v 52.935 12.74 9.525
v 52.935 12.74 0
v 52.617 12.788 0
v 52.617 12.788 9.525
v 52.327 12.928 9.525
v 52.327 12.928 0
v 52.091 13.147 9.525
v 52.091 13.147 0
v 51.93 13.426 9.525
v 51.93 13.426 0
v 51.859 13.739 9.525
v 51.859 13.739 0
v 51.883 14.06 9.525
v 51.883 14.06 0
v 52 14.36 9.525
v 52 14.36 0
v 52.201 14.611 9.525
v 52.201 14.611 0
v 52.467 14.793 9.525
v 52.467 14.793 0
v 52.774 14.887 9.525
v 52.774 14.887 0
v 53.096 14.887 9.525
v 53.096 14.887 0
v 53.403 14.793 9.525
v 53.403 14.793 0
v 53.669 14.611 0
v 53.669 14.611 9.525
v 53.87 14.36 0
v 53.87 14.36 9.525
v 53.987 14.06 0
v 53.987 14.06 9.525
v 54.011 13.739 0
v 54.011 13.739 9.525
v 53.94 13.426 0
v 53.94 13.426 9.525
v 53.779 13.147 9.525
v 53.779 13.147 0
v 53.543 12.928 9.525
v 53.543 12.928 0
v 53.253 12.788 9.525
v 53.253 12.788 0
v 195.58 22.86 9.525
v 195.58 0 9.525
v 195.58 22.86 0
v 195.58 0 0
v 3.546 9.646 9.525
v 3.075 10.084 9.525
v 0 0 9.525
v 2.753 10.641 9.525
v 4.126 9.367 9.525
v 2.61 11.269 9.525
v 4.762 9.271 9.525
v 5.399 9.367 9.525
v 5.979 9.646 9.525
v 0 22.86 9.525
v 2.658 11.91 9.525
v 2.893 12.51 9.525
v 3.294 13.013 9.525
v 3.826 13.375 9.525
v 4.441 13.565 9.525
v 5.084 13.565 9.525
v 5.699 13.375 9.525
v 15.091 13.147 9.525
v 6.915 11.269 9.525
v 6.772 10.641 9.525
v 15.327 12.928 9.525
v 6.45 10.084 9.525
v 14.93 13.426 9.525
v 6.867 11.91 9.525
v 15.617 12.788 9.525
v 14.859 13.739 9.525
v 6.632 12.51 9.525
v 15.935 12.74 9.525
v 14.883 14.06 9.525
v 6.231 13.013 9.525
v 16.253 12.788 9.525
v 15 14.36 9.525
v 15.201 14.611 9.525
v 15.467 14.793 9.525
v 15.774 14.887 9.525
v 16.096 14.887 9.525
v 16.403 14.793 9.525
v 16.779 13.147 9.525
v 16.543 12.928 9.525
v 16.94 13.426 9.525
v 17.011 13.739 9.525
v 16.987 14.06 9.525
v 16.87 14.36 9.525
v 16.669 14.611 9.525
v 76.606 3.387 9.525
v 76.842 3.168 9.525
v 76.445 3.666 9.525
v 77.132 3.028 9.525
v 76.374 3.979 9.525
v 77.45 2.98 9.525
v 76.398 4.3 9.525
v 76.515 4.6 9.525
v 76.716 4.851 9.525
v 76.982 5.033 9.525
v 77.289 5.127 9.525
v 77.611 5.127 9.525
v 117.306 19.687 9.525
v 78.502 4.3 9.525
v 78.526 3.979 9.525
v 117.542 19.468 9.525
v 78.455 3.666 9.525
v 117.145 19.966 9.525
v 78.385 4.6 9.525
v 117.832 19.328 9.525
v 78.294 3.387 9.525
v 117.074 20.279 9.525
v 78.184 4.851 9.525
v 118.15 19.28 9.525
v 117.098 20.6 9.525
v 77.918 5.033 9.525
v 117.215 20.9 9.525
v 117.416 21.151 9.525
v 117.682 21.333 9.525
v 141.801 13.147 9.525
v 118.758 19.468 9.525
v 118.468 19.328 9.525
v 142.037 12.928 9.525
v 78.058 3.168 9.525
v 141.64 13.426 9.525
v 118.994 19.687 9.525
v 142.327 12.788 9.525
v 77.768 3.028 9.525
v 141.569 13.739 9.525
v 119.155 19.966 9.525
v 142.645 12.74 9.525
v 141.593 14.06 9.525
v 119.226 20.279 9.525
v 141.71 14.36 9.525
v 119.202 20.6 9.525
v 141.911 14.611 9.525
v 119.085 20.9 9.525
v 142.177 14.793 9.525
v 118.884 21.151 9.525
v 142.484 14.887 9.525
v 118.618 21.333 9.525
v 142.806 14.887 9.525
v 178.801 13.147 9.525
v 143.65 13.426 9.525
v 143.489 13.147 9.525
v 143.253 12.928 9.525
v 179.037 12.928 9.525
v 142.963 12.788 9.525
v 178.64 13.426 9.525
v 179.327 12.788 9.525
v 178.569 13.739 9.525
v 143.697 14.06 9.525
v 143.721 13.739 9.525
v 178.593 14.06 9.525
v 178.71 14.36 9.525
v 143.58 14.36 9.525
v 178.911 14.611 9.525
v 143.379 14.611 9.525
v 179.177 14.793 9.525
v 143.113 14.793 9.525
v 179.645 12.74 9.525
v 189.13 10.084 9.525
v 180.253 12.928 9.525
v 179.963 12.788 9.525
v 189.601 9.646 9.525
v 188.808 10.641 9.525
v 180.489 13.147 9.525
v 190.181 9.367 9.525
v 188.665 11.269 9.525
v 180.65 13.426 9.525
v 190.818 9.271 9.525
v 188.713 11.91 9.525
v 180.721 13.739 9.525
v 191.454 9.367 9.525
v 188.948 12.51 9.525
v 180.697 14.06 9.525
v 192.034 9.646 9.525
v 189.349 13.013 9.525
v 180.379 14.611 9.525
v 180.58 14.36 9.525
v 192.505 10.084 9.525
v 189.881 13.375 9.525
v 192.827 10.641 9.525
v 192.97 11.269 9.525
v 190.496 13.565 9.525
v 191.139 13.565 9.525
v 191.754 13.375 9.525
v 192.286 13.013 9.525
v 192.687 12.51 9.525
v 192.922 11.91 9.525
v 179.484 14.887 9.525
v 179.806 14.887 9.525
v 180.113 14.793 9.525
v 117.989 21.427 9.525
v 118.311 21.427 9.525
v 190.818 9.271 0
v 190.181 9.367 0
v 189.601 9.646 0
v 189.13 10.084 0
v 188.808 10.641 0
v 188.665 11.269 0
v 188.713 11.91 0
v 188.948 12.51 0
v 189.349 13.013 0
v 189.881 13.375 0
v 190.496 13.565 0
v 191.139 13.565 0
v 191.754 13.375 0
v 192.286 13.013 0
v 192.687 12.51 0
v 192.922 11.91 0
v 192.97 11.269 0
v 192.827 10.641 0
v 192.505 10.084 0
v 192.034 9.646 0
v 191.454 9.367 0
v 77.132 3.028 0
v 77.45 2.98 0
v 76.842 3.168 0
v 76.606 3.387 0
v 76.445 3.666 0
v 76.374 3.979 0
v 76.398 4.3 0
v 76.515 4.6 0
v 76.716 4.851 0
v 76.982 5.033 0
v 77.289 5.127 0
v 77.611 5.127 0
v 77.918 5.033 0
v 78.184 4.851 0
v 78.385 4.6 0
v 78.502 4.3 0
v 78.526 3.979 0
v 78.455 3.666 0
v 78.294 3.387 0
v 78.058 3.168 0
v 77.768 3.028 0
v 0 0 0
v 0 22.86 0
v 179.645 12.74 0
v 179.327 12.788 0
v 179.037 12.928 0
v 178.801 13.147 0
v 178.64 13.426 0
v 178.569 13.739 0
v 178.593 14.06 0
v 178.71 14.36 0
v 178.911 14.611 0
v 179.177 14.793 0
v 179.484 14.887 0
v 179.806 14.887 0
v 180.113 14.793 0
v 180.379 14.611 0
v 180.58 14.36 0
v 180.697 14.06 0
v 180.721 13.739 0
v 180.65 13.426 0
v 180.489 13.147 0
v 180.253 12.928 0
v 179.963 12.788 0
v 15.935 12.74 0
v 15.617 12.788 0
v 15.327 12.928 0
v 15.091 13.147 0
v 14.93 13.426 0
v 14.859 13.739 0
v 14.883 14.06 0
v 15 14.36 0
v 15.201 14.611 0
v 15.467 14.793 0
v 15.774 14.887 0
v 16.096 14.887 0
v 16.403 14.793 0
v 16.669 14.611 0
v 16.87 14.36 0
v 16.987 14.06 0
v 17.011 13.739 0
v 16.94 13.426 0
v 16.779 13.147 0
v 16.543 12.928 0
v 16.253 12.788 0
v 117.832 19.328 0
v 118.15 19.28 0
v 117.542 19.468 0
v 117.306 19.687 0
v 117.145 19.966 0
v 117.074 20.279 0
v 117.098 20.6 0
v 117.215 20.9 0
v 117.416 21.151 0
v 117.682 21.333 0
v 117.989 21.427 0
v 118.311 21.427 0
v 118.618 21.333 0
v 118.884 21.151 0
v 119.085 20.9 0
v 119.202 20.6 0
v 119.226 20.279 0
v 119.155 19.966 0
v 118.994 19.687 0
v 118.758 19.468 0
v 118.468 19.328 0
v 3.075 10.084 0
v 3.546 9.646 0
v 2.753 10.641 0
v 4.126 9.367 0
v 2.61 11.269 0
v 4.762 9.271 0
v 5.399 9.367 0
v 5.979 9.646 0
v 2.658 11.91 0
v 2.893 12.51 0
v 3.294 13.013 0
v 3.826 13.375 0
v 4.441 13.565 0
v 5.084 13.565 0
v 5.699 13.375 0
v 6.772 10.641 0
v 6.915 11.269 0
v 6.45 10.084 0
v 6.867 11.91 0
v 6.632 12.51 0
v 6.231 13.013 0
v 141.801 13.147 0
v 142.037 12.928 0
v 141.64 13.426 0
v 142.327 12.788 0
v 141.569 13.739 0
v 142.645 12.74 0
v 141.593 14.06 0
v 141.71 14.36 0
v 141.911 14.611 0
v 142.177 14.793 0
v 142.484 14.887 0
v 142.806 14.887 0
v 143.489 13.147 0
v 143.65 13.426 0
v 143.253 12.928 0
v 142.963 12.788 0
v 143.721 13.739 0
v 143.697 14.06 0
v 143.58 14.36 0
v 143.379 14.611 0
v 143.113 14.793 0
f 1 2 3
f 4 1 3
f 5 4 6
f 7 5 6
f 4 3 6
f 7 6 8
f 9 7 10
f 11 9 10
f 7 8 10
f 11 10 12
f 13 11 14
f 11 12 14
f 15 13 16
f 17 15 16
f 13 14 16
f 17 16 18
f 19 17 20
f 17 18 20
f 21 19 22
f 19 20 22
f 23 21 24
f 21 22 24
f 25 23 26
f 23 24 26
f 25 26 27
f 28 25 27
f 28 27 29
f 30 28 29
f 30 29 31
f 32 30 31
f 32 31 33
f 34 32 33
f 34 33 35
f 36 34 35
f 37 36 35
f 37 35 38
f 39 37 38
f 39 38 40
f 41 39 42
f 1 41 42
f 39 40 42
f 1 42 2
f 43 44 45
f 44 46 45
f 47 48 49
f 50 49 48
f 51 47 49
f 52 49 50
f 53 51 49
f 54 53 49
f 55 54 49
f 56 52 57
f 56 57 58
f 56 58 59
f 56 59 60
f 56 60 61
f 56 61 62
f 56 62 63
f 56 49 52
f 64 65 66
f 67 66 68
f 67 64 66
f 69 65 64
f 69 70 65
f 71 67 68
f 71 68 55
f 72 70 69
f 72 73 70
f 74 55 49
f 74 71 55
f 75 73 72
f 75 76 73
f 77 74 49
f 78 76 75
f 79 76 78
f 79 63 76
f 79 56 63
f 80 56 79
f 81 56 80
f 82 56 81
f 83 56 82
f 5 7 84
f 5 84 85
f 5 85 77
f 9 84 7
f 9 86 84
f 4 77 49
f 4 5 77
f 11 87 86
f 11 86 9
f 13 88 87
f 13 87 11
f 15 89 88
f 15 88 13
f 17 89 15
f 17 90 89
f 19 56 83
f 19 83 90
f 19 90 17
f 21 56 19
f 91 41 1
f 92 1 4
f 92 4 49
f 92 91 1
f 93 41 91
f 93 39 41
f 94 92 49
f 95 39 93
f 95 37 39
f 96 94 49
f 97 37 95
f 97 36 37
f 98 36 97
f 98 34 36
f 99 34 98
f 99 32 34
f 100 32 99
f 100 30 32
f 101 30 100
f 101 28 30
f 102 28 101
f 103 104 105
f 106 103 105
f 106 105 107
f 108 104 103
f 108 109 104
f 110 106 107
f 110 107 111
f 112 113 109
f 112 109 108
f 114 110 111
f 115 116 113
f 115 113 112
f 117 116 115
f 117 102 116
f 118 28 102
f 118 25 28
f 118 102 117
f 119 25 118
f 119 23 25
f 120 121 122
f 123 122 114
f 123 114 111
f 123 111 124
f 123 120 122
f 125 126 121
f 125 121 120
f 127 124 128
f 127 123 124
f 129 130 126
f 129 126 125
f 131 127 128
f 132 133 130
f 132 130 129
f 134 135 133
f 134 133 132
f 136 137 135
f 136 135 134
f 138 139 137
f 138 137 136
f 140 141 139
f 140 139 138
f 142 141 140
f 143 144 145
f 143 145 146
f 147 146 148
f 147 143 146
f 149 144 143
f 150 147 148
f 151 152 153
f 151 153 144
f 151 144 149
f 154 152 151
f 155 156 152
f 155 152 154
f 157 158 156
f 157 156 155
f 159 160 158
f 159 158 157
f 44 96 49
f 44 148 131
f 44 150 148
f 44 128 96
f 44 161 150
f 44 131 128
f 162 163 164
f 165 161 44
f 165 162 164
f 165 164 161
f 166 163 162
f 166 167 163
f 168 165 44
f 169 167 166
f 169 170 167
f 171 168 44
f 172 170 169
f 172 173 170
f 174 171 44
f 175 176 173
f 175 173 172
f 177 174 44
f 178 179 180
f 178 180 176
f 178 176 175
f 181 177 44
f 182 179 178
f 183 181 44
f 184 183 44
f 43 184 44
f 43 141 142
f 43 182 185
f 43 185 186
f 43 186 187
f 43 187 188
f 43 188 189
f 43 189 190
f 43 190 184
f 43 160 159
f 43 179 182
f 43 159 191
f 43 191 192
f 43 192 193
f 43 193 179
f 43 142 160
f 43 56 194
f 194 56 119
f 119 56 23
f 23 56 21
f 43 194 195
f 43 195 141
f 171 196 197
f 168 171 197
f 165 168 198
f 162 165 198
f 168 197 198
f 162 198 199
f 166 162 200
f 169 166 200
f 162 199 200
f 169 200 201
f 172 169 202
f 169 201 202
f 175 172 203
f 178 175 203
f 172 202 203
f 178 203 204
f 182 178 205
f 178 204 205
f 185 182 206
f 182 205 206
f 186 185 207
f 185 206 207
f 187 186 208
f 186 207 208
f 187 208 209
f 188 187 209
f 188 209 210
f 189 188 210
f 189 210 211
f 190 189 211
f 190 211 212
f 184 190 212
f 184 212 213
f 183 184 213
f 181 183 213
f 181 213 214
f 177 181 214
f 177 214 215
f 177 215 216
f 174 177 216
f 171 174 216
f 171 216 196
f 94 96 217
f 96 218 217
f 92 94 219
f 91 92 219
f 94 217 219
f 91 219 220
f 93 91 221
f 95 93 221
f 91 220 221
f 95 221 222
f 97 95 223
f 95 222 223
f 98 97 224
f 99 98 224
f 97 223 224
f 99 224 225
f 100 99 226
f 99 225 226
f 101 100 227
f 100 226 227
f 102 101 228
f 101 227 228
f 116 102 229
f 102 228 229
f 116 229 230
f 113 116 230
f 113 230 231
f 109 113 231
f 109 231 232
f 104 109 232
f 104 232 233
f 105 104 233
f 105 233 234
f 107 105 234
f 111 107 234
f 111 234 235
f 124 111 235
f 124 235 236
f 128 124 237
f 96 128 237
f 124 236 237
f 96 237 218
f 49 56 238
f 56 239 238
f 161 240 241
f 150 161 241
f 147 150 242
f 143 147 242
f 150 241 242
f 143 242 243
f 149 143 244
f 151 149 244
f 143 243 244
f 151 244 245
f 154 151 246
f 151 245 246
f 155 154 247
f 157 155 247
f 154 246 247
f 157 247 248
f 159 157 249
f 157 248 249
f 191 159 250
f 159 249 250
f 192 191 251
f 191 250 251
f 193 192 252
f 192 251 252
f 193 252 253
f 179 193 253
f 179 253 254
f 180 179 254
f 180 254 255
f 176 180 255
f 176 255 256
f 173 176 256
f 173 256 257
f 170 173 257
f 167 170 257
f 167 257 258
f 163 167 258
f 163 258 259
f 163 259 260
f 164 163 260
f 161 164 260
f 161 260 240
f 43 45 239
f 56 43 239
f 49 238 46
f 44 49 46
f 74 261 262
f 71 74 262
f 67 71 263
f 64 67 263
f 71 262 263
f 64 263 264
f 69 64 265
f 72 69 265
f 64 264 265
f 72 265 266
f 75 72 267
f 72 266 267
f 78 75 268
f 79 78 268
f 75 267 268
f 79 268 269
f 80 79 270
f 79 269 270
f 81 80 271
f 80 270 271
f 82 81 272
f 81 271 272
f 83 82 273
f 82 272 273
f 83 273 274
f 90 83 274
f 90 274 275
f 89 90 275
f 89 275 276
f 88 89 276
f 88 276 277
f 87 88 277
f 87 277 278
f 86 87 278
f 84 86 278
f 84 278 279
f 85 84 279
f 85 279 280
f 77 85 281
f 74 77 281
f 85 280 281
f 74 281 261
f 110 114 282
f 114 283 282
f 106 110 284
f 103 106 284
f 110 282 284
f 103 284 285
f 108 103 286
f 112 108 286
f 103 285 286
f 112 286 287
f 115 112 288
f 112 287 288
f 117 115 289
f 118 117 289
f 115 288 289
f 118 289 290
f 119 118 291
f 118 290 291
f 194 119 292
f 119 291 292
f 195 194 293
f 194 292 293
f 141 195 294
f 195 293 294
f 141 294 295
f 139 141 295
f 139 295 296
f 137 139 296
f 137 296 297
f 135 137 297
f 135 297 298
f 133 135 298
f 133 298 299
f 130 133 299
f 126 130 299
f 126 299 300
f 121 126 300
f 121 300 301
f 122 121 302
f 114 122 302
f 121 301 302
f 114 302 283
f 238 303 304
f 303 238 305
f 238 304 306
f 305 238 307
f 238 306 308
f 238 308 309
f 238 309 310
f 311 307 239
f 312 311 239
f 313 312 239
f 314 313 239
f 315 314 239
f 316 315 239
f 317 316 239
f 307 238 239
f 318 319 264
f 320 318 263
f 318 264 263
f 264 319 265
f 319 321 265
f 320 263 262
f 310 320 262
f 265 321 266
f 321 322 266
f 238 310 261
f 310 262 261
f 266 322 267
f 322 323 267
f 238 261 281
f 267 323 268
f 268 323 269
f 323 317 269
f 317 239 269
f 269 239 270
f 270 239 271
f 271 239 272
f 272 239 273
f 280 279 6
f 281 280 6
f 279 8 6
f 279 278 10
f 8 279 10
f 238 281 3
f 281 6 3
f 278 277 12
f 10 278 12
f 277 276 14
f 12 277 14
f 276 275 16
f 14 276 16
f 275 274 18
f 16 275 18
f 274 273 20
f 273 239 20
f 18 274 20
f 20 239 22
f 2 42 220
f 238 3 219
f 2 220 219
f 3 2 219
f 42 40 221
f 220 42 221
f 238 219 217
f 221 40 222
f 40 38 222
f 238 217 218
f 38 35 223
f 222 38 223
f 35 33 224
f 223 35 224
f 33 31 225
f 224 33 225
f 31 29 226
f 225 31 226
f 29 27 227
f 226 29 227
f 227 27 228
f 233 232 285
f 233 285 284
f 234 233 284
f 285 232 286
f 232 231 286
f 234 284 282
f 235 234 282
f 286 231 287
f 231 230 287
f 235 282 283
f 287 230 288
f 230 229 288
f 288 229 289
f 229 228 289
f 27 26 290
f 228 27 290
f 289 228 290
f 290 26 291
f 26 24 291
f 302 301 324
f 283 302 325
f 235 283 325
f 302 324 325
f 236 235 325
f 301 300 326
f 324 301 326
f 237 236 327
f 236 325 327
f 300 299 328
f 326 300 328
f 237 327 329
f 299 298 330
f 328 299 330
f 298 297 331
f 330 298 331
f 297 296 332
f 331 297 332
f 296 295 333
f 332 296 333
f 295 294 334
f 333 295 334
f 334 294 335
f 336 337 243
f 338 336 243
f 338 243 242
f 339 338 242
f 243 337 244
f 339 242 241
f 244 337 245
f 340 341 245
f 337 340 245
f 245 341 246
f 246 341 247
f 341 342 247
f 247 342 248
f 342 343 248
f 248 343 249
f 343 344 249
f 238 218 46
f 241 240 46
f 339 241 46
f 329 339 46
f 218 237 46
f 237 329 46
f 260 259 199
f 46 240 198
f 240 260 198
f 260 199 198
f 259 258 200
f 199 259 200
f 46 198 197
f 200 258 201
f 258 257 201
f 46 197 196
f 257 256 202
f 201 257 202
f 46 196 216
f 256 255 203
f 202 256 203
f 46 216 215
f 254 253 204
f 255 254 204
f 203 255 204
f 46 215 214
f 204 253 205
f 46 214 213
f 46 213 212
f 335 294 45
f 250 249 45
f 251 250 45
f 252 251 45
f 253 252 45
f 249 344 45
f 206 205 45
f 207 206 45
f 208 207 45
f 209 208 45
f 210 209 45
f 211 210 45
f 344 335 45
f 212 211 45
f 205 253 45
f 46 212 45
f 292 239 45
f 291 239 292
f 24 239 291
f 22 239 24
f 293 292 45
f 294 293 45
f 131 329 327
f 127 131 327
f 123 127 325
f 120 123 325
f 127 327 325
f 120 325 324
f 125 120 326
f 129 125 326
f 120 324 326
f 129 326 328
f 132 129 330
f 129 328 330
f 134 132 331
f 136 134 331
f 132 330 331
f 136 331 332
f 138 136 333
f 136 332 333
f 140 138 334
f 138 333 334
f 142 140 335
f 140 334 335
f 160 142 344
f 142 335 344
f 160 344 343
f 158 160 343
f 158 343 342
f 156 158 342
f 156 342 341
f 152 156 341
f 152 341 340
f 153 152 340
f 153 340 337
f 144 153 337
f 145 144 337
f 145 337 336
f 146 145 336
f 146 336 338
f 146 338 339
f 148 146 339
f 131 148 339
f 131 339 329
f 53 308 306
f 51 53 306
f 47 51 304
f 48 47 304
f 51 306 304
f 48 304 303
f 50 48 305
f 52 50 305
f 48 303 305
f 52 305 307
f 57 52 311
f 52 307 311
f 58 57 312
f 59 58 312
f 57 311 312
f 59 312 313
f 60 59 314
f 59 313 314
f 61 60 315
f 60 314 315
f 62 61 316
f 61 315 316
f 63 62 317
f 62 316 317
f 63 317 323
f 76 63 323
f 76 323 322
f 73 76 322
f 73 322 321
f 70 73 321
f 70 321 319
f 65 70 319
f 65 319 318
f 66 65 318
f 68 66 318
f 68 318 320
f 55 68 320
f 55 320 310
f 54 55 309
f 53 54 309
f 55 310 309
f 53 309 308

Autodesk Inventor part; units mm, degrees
ref_plane "YZ Plane" through (0, 0, 0) normal (1, 0, 0) x (0, 1, 0)
ref_plane "XZ Plane" through (0, 0, 0) normal (0, 1, 0) x (-1, 0, 0)
ref_plane "XY Plane" through (0, 0, 0) normal (0, 0, 1) x (1, 0, 0)
sketch "Sketch1" plane through (0, 0, 0) normal (0, 0, 1) x (1, 0, 0)
  line L0 (0, 0) -> (195.58, 0)
  line L1 (195.58, 0) -> (195.58, 22.86)
  line L2 (195.58, 22.86) -> (0, 22.86)
  line L3 (0, 22.86) -> (0, 0)
  dimension "d0" = 22.86
  dimension "d1" = 195.58
extrude "Extrusion1" add sketch "Sketch1" along normal blind 9.525
sketch "Sketch2" plane through (0, 0, 9.525) normal (0, 0, 1) x (1, 0, 0)
  line L0 (0, 34.235) -> (9.525, 34.235) projected
  line L1 (0, 0) -> (0, 34.235) projected
  line L2 (9.525, 0) -> (0, 0) projected
  line L3 (9.525, 34.235) -> (9.525, 0) projected
  line L4 (73.66, 34.235) -> (83.185, 34.235) projected
  line L5 (73.66, 0) -> (73.66, 34.235) projected
  line L6 (83.185, 0) -> (73.66, 0) projected
  line L7 (83.185, 34.235) -> (83.185, 0) projected
  line L8 (121.92, 34.235) -> (112.395, 34.235)
  line L9 (112.395, 34.235) -> (112.395, 0)
  line L10 (112.395, 0) -> (121.92, 0)
  line L11 (121.92, 0) -> (121.92, 34.235)
  line L12 (195.58, 34.235) -> (186.055, 34.235)
  line L13 (186.055, 34.235) -> (186.055, 0)
  line L14 (186.055, 0) -> (195.58, 0)
  line L15 (195.58, 0) -> (195.58, 34.235)
  circle A0 centre (77.45, 4.06) radius 1.0795 projected
  circle A1 centre (77.45, 20.36) radius 1.0795 projected
  circle A2 centre (4.7625, 11.43) radius 1.651 projected
  point P0 (4.7625, 11.43)
  point P1 (190.8175, 11.43)
hole "Hole1" at (4.7625, 11.43, 9.525) at (190.8175, 11.43, 9.525) direction (0, 0, -1) diameter 4.318 end through all clearance for "Flat Head Machine Screw (82)" size "#8" standard "Ansi Unified Screw Threads"
sketch "Sketch3" plane through (0, 0, 9.525) normal (0, 0, 1) x (1, 0, 0)
  circle A0 centre (52.935, 13.82) radius 1.6 projected
  circle A1 centre (15.935, 13.82) radius 1.6 projected
  circle A2 centre (77.45, 4.06) radius 1.55 projected
  circle A3 centre (118.15, 20.36) radius 1.55 projected
  circle A4 centre (142.645, 13.82) radius 1.6 projected
  circle A5 centre (179.645, 13.82) radius 1.6 projected
hole "Hole2" at (77.45, 4.06, 9.525) at (118.15, 20.36, 9.525) at (52.935, 13.82, 9.525) at (15.935, 13.82, 9.525) at (142.645, 13.82, 9.525) at (179.645, 13.82, 9.525) direction (0, 0, -1) diameter 2.159 end through all
properties part number "SensorBar"
